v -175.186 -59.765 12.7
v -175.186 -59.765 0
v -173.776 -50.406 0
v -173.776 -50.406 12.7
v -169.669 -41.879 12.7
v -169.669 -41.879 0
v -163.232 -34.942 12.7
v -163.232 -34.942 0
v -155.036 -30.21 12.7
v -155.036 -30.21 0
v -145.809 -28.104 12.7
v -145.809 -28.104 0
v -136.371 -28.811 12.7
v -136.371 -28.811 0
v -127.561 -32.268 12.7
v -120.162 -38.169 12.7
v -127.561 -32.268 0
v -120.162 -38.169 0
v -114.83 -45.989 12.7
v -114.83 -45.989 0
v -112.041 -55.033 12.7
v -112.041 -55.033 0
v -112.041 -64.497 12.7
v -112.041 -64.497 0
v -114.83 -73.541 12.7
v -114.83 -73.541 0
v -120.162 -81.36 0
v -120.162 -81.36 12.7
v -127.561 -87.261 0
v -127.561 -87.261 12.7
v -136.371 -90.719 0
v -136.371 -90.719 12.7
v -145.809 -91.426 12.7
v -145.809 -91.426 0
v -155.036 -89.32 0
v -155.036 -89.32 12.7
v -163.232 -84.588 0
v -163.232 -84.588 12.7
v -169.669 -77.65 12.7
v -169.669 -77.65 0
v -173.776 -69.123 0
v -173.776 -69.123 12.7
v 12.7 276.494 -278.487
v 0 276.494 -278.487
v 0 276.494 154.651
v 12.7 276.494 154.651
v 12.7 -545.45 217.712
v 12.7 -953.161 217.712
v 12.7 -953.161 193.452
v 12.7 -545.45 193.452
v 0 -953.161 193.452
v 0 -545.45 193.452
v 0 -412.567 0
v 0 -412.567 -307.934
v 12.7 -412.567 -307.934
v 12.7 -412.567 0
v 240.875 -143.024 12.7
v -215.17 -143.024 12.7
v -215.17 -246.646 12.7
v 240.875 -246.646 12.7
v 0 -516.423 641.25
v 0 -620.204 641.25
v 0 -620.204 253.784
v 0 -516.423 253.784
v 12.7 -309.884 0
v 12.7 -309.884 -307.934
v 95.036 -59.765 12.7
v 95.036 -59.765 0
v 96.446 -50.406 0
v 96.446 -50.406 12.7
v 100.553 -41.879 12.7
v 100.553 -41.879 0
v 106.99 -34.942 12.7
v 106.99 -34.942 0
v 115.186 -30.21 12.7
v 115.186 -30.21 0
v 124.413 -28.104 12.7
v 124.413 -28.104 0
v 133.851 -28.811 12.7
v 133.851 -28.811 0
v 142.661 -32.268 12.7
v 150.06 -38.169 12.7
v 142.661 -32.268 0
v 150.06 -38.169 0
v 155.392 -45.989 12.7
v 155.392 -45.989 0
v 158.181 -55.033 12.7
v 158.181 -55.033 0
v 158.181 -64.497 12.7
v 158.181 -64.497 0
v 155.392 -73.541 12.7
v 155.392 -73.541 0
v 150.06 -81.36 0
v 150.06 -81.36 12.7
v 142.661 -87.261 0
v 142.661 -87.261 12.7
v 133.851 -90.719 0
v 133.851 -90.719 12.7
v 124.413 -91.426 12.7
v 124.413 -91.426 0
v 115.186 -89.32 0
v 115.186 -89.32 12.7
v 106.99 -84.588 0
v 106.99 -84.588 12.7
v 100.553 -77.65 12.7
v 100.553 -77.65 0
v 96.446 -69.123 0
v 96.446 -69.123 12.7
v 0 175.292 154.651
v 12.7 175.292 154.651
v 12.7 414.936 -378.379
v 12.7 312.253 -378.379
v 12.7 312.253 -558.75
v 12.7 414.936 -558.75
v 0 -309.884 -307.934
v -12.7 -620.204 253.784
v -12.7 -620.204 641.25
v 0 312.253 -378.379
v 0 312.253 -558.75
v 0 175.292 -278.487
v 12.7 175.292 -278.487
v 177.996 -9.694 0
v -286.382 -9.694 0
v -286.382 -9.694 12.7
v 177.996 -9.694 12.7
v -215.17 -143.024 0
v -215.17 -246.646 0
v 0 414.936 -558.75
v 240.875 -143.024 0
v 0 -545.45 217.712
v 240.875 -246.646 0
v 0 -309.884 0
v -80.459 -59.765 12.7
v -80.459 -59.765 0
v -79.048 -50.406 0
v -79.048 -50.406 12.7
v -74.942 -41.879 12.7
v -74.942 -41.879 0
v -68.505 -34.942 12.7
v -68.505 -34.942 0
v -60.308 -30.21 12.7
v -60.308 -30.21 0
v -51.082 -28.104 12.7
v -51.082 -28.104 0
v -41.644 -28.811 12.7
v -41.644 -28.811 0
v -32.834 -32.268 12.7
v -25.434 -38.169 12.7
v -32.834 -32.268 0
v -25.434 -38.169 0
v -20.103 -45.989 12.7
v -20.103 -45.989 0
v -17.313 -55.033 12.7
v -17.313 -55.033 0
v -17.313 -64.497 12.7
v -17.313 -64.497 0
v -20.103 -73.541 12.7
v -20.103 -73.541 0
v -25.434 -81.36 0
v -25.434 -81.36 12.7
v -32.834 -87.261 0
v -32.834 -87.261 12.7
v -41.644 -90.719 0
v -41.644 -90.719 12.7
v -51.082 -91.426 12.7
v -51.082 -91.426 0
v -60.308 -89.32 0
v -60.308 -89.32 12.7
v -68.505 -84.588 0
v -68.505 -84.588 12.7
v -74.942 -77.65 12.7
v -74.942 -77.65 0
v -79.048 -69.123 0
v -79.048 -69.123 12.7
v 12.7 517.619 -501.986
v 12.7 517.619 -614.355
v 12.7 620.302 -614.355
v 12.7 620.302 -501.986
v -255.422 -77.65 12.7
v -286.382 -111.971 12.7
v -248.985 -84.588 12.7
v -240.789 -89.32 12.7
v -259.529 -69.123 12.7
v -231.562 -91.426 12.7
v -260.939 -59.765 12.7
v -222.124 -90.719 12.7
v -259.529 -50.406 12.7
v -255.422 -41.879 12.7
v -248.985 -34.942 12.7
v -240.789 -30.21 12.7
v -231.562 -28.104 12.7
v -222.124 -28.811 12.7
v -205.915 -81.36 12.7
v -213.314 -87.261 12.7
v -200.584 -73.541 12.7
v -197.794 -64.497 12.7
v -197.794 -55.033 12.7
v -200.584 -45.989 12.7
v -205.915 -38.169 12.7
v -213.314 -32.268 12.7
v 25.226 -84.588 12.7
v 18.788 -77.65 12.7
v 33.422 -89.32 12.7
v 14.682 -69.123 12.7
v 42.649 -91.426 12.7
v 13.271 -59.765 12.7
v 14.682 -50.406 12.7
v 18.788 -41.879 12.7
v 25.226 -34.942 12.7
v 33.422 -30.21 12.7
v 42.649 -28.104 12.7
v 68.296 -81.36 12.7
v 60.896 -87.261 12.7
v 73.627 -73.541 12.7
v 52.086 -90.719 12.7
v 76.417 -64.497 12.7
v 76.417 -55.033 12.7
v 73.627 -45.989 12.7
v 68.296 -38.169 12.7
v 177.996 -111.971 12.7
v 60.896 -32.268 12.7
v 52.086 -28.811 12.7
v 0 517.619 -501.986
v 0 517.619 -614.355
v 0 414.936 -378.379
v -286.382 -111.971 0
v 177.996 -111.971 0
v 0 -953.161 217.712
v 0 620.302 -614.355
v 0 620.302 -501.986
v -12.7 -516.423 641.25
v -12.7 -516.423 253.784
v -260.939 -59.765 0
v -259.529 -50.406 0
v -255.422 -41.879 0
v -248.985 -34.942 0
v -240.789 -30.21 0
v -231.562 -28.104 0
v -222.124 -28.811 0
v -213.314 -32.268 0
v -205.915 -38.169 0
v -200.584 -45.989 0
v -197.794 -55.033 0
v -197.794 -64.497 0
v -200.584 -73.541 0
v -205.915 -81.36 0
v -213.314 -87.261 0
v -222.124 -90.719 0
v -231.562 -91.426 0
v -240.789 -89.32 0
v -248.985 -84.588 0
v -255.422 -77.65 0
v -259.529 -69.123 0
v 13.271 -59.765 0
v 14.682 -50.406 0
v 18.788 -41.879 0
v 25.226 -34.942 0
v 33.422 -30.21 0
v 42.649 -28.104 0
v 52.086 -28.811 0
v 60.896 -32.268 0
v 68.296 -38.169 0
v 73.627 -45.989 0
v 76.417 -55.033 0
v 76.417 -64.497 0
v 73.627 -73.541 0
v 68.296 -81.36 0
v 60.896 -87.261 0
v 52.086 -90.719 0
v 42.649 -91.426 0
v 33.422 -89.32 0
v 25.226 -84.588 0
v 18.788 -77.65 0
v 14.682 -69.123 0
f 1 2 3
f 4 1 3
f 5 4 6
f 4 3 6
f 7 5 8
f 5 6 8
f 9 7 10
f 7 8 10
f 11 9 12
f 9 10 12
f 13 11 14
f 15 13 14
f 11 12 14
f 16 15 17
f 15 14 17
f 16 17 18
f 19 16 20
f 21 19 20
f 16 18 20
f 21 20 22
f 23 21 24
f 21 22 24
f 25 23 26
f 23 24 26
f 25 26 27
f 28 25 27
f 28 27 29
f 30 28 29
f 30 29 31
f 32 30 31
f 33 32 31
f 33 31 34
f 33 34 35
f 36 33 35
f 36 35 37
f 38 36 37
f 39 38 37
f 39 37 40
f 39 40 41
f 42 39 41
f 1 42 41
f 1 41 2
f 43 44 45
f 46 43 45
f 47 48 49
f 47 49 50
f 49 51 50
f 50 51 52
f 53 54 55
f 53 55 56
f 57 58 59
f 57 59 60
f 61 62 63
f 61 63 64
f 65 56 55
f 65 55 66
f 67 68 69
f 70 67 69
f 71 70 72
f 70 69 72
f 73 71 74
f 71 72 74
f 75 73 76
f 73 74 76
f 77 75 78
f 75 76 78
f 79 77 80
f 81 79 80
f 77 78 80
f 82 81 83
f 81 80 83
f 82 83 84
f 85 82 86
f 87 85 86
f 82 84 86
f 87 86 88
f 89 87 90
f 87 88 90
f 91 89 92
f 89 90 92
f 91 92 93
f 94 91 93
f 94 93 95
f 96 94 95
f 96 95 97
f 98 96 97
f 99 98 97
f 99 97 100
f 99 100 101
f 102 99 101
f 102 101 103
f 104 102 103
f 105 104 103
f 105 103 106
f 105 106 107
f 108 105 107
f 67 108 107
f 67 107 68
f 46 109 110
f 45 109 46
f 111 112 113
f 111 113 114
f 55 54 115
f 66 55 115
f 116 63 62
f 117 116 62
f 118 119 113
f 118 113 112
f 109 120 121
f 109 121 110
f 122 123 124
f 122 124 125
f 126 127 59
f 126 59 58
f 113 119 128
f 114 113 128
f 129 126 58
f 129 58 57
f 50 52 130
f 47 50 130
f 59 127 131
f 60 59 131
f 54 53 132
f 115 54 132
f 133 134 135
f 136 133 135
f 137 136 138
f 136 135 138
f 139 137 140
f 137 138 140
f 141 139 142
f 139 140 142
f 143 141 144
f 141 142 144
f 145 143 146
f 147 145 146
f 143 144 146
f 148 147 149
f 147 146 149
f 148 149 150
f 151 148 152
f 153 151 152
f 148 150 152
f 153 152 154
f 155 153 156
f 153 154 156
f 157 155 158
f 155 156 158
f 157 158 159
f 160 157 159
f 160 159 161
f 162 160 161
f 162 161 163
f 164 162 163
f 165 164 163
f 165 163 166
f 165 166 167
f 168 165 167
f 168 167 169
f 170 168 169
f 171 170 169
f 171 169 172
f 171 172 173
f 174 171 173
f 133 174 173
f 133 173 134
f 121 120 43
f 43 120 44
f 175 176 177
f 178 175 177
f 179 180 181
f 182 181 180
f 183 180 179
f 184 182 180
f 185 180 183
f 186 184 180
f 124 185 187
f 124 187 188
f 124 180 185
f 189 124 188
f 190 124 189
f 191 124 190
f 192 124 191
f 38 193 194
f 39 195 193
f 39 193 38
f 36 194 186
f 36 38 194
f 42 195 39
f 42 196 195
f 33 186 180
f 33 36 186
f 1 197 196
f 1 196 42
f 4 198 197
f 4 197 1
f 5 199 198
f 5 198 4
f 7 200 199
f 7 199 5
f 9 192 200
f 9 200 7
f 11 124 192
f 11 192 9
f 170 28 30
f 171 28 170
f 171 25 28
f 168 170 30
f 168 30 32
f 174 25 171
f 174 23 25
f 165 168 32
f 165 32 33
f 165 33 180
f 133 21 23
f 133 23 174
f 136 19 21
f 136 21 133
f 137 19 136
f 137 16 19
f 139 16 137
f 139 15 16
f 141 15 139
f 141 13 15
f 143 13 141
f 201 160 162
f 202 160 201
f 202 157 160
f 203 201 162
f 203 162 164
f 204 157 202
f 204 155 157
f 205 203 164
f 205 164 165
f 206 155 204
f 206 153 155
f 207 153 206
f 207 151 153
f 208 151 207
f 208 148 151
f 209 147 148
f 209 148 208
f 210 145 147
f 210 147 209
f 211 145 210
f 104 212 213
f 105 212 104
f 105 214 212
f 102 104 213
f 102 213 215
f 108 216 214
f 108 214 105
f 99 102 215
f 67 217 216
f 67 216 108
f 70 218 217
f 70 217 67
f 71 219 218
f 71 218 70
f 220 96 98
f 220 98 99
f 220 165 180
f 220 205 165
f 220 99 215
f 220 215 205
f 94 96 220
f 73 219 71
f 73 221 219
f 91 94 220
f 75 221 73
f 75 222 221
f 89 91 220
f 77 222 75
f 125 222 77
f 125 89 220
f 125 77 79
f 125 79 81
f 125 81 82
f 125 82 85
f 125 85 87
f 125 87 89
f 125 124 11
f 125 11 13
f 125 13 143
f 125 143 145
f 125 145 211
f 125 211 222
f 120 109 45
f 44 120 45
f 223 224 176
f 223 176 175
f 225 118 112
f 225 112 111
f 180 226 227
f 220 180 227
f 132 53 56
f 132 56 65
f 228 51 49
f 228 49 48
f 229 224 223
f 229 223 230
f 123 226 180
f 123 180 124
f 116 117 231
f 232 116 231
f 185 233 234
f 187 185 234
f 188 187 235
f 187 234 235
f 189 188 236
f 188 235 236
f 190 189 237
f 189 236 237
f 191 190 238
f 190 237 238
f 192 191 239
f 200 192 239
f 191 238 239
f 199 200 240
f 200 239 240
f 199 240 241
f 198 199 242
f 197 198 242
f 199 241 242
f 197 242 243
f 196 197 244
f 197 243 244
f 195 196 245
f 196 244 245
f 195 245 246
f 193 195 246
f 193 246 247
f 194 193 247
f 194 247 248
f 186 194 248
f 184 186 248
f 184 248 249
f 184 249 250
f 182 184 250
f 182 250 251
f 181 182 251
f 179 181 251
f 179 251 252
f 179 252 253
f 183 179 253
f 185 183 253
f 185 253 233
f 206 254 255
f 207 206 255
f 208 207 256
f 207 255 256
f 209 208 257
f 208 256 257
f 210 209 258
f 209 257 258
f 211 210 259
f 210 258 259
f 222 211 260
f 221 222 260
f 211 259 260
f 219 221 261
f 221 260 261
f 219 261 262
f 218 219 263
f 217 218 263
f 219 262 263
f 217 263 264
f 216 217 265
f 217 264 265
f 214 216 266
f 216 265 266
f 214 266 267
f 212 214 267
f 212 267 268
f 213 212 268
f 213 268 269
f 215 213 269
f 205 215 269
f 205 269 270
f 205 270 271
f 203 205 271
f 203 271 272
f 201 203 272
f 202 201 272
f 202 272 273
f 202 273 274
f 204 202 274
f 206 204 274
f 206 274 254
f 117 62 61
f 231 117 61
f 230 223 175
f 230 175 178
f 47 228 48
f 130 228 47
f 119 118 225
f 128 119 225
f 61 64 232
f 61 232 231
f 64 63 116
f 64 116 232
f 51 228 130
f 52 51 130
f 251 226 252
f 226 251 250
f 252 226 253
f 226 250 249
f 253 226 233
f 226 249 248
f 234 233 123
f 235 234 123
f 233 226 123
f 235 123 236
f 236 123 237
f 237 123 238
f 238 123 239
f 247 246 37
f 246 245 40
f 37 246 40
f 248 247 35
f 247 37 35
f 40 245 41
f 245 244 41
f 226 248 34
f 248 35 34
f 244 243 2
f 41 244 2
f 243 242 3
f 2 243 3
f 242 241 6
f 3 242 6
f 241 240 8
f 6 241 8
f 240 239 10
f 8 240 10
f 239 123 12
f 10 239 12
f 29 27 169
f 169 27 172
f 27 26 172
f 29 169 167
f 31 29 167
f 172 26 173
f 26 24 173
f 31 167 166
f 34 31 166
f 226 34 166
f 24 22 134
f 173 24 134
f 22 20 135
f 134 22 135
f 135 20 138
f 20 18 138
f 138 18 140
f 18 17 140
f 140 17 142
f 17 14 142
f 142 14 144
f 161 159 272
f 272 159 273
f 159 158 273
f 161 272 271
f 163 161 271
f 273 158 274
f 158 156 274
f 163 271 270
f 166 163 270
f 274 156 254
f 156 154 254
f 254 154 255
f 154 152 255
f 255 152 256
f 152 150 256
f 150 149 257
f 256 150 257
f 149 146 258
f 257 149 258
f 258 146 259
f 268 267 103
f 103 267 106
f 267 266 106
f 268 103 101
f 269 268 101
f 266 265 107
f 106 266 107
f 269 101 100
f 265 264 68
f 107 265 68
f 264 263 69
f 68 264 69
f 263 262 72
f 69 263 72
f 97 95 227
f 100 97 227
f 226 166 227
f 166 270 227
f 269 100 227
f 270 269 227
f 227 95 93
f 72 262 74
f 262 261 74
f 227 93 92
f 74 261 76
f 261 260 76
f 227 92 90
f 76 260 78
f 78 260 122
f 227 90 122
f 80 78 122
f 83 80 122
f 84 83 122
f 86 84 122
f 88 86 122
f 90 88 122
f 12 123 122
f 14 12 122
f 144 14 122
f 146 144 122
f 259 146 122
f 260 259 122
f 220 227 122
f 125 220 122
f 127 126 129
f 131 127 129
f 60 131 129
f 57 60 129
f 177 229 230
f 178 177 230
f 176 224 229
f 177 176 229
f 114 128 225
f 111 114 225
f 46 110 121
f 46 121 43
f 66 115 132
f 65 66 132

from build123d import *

# Parameters (mm, degrees)
F0_W      = 464.377426
F0_H      = 102.27714
F1_DEPTH  = 12.7
F3_D      = 63.5
F4_W      = 456.045419
F4_H      = 103.622362
F5_DEPTH  = 12.7
F6_W      = 101.202175
F6_H      = 433.137476
F7_DEPTH  = 12.7
F8_W      = 103.781164
F8_H      = 387.466371
F9_DEPTH  = 12.7
F10_W     = 102.682799
F10_H     = 307.933718
F10_W_2   = 102.682859
F10_H_2   = 180.371225
F11_DEPTH = 12.7
F12_W     = 102.682829
F12_H     = 112.36906
F13_DEPTH = 12.7
F14_W     = 407.711148
F14_H     = 24.260089
F15_DEPTH = 12.7


with BuildPart() as f1:
    # F0 (on Top) → F1 (new body)
    with BuildSketch(Plane.XY):
        with Locations((-54.193076, -60.832071)):
            Rectangle(F0_W, F0_H)
    extrude(amount=F1_DEPTH)

    # F3 (through all)
    with Locations(Plane.XY.offset(12.7)):
        with Locations((-229.189292, -59.764758), (-143.436149, -59.764758), (-48.708864, -59.764758), (45.02131, -59.764758), (126.785904, -59.764758)):
            Hole(F3_D / 2)


with BuildPart() as f5:
    # F4 (on Top) → F5 (new body)
    with BuildSketch(Plane.XY):
        with Locations((12.85243, -194.835)):
            Rectangle(F4_W, F4_H)
    extrude(amount=F5_DEPTH)


with BuildPart() as f7:
    # F6 (on Right) → F7 (new body)
    with BuildSketch(Plane.YZ):
        with Locations((225.893266, -61.918199)):
            Rectangle(F6_W, F6_H)
    extrude(amount=F7_DEPTH)


with BuildPart() as f9:
    # F8 (on Right) → F9 (new body)
    with BuildSketch(Plane.YZ):
        with Locations((-568.313271, 447.517067)):
            Rectangle(F8_W, F8_H)
    extrude(amount=-F9_DEPTH)


with BuildPart() as f11:
    # F10 (on Right) → F11 (new body)
    with BuildSketch(Plane.YZ):
        with Locations((-361.225114, -153.966859)):
            Rectangle(F10_W, F10_H)
        with Locations((363.594875, -468.564778)):
            Rectangle(F10_W_2, F10_H_2)
    extrude(amount=F11_DEPTH)


with BuildPart() as f13:
    # F12 (on Right) → F13 (new body)
    with BuildSketch(Plane.YZ):
        with Locations((568.960547, -558.170259)):
            Rectangle(F12_W, F12_H)
    extrude(amount=F13_DEPTH)


with BuildPart() as f15:
    # F14 (on Right) → F15 (new body)
    with BuildSketch(Plane.YZ):
        with Locations((-749.305785, 205.581672)):
            Rectangle(F14_W, F14_H)
    extrude(amount=F15_DEPTH)


solid = Compound([f1.part, f5.part, f7.part, f9.part, f11.part, f13.part, f15.part])
